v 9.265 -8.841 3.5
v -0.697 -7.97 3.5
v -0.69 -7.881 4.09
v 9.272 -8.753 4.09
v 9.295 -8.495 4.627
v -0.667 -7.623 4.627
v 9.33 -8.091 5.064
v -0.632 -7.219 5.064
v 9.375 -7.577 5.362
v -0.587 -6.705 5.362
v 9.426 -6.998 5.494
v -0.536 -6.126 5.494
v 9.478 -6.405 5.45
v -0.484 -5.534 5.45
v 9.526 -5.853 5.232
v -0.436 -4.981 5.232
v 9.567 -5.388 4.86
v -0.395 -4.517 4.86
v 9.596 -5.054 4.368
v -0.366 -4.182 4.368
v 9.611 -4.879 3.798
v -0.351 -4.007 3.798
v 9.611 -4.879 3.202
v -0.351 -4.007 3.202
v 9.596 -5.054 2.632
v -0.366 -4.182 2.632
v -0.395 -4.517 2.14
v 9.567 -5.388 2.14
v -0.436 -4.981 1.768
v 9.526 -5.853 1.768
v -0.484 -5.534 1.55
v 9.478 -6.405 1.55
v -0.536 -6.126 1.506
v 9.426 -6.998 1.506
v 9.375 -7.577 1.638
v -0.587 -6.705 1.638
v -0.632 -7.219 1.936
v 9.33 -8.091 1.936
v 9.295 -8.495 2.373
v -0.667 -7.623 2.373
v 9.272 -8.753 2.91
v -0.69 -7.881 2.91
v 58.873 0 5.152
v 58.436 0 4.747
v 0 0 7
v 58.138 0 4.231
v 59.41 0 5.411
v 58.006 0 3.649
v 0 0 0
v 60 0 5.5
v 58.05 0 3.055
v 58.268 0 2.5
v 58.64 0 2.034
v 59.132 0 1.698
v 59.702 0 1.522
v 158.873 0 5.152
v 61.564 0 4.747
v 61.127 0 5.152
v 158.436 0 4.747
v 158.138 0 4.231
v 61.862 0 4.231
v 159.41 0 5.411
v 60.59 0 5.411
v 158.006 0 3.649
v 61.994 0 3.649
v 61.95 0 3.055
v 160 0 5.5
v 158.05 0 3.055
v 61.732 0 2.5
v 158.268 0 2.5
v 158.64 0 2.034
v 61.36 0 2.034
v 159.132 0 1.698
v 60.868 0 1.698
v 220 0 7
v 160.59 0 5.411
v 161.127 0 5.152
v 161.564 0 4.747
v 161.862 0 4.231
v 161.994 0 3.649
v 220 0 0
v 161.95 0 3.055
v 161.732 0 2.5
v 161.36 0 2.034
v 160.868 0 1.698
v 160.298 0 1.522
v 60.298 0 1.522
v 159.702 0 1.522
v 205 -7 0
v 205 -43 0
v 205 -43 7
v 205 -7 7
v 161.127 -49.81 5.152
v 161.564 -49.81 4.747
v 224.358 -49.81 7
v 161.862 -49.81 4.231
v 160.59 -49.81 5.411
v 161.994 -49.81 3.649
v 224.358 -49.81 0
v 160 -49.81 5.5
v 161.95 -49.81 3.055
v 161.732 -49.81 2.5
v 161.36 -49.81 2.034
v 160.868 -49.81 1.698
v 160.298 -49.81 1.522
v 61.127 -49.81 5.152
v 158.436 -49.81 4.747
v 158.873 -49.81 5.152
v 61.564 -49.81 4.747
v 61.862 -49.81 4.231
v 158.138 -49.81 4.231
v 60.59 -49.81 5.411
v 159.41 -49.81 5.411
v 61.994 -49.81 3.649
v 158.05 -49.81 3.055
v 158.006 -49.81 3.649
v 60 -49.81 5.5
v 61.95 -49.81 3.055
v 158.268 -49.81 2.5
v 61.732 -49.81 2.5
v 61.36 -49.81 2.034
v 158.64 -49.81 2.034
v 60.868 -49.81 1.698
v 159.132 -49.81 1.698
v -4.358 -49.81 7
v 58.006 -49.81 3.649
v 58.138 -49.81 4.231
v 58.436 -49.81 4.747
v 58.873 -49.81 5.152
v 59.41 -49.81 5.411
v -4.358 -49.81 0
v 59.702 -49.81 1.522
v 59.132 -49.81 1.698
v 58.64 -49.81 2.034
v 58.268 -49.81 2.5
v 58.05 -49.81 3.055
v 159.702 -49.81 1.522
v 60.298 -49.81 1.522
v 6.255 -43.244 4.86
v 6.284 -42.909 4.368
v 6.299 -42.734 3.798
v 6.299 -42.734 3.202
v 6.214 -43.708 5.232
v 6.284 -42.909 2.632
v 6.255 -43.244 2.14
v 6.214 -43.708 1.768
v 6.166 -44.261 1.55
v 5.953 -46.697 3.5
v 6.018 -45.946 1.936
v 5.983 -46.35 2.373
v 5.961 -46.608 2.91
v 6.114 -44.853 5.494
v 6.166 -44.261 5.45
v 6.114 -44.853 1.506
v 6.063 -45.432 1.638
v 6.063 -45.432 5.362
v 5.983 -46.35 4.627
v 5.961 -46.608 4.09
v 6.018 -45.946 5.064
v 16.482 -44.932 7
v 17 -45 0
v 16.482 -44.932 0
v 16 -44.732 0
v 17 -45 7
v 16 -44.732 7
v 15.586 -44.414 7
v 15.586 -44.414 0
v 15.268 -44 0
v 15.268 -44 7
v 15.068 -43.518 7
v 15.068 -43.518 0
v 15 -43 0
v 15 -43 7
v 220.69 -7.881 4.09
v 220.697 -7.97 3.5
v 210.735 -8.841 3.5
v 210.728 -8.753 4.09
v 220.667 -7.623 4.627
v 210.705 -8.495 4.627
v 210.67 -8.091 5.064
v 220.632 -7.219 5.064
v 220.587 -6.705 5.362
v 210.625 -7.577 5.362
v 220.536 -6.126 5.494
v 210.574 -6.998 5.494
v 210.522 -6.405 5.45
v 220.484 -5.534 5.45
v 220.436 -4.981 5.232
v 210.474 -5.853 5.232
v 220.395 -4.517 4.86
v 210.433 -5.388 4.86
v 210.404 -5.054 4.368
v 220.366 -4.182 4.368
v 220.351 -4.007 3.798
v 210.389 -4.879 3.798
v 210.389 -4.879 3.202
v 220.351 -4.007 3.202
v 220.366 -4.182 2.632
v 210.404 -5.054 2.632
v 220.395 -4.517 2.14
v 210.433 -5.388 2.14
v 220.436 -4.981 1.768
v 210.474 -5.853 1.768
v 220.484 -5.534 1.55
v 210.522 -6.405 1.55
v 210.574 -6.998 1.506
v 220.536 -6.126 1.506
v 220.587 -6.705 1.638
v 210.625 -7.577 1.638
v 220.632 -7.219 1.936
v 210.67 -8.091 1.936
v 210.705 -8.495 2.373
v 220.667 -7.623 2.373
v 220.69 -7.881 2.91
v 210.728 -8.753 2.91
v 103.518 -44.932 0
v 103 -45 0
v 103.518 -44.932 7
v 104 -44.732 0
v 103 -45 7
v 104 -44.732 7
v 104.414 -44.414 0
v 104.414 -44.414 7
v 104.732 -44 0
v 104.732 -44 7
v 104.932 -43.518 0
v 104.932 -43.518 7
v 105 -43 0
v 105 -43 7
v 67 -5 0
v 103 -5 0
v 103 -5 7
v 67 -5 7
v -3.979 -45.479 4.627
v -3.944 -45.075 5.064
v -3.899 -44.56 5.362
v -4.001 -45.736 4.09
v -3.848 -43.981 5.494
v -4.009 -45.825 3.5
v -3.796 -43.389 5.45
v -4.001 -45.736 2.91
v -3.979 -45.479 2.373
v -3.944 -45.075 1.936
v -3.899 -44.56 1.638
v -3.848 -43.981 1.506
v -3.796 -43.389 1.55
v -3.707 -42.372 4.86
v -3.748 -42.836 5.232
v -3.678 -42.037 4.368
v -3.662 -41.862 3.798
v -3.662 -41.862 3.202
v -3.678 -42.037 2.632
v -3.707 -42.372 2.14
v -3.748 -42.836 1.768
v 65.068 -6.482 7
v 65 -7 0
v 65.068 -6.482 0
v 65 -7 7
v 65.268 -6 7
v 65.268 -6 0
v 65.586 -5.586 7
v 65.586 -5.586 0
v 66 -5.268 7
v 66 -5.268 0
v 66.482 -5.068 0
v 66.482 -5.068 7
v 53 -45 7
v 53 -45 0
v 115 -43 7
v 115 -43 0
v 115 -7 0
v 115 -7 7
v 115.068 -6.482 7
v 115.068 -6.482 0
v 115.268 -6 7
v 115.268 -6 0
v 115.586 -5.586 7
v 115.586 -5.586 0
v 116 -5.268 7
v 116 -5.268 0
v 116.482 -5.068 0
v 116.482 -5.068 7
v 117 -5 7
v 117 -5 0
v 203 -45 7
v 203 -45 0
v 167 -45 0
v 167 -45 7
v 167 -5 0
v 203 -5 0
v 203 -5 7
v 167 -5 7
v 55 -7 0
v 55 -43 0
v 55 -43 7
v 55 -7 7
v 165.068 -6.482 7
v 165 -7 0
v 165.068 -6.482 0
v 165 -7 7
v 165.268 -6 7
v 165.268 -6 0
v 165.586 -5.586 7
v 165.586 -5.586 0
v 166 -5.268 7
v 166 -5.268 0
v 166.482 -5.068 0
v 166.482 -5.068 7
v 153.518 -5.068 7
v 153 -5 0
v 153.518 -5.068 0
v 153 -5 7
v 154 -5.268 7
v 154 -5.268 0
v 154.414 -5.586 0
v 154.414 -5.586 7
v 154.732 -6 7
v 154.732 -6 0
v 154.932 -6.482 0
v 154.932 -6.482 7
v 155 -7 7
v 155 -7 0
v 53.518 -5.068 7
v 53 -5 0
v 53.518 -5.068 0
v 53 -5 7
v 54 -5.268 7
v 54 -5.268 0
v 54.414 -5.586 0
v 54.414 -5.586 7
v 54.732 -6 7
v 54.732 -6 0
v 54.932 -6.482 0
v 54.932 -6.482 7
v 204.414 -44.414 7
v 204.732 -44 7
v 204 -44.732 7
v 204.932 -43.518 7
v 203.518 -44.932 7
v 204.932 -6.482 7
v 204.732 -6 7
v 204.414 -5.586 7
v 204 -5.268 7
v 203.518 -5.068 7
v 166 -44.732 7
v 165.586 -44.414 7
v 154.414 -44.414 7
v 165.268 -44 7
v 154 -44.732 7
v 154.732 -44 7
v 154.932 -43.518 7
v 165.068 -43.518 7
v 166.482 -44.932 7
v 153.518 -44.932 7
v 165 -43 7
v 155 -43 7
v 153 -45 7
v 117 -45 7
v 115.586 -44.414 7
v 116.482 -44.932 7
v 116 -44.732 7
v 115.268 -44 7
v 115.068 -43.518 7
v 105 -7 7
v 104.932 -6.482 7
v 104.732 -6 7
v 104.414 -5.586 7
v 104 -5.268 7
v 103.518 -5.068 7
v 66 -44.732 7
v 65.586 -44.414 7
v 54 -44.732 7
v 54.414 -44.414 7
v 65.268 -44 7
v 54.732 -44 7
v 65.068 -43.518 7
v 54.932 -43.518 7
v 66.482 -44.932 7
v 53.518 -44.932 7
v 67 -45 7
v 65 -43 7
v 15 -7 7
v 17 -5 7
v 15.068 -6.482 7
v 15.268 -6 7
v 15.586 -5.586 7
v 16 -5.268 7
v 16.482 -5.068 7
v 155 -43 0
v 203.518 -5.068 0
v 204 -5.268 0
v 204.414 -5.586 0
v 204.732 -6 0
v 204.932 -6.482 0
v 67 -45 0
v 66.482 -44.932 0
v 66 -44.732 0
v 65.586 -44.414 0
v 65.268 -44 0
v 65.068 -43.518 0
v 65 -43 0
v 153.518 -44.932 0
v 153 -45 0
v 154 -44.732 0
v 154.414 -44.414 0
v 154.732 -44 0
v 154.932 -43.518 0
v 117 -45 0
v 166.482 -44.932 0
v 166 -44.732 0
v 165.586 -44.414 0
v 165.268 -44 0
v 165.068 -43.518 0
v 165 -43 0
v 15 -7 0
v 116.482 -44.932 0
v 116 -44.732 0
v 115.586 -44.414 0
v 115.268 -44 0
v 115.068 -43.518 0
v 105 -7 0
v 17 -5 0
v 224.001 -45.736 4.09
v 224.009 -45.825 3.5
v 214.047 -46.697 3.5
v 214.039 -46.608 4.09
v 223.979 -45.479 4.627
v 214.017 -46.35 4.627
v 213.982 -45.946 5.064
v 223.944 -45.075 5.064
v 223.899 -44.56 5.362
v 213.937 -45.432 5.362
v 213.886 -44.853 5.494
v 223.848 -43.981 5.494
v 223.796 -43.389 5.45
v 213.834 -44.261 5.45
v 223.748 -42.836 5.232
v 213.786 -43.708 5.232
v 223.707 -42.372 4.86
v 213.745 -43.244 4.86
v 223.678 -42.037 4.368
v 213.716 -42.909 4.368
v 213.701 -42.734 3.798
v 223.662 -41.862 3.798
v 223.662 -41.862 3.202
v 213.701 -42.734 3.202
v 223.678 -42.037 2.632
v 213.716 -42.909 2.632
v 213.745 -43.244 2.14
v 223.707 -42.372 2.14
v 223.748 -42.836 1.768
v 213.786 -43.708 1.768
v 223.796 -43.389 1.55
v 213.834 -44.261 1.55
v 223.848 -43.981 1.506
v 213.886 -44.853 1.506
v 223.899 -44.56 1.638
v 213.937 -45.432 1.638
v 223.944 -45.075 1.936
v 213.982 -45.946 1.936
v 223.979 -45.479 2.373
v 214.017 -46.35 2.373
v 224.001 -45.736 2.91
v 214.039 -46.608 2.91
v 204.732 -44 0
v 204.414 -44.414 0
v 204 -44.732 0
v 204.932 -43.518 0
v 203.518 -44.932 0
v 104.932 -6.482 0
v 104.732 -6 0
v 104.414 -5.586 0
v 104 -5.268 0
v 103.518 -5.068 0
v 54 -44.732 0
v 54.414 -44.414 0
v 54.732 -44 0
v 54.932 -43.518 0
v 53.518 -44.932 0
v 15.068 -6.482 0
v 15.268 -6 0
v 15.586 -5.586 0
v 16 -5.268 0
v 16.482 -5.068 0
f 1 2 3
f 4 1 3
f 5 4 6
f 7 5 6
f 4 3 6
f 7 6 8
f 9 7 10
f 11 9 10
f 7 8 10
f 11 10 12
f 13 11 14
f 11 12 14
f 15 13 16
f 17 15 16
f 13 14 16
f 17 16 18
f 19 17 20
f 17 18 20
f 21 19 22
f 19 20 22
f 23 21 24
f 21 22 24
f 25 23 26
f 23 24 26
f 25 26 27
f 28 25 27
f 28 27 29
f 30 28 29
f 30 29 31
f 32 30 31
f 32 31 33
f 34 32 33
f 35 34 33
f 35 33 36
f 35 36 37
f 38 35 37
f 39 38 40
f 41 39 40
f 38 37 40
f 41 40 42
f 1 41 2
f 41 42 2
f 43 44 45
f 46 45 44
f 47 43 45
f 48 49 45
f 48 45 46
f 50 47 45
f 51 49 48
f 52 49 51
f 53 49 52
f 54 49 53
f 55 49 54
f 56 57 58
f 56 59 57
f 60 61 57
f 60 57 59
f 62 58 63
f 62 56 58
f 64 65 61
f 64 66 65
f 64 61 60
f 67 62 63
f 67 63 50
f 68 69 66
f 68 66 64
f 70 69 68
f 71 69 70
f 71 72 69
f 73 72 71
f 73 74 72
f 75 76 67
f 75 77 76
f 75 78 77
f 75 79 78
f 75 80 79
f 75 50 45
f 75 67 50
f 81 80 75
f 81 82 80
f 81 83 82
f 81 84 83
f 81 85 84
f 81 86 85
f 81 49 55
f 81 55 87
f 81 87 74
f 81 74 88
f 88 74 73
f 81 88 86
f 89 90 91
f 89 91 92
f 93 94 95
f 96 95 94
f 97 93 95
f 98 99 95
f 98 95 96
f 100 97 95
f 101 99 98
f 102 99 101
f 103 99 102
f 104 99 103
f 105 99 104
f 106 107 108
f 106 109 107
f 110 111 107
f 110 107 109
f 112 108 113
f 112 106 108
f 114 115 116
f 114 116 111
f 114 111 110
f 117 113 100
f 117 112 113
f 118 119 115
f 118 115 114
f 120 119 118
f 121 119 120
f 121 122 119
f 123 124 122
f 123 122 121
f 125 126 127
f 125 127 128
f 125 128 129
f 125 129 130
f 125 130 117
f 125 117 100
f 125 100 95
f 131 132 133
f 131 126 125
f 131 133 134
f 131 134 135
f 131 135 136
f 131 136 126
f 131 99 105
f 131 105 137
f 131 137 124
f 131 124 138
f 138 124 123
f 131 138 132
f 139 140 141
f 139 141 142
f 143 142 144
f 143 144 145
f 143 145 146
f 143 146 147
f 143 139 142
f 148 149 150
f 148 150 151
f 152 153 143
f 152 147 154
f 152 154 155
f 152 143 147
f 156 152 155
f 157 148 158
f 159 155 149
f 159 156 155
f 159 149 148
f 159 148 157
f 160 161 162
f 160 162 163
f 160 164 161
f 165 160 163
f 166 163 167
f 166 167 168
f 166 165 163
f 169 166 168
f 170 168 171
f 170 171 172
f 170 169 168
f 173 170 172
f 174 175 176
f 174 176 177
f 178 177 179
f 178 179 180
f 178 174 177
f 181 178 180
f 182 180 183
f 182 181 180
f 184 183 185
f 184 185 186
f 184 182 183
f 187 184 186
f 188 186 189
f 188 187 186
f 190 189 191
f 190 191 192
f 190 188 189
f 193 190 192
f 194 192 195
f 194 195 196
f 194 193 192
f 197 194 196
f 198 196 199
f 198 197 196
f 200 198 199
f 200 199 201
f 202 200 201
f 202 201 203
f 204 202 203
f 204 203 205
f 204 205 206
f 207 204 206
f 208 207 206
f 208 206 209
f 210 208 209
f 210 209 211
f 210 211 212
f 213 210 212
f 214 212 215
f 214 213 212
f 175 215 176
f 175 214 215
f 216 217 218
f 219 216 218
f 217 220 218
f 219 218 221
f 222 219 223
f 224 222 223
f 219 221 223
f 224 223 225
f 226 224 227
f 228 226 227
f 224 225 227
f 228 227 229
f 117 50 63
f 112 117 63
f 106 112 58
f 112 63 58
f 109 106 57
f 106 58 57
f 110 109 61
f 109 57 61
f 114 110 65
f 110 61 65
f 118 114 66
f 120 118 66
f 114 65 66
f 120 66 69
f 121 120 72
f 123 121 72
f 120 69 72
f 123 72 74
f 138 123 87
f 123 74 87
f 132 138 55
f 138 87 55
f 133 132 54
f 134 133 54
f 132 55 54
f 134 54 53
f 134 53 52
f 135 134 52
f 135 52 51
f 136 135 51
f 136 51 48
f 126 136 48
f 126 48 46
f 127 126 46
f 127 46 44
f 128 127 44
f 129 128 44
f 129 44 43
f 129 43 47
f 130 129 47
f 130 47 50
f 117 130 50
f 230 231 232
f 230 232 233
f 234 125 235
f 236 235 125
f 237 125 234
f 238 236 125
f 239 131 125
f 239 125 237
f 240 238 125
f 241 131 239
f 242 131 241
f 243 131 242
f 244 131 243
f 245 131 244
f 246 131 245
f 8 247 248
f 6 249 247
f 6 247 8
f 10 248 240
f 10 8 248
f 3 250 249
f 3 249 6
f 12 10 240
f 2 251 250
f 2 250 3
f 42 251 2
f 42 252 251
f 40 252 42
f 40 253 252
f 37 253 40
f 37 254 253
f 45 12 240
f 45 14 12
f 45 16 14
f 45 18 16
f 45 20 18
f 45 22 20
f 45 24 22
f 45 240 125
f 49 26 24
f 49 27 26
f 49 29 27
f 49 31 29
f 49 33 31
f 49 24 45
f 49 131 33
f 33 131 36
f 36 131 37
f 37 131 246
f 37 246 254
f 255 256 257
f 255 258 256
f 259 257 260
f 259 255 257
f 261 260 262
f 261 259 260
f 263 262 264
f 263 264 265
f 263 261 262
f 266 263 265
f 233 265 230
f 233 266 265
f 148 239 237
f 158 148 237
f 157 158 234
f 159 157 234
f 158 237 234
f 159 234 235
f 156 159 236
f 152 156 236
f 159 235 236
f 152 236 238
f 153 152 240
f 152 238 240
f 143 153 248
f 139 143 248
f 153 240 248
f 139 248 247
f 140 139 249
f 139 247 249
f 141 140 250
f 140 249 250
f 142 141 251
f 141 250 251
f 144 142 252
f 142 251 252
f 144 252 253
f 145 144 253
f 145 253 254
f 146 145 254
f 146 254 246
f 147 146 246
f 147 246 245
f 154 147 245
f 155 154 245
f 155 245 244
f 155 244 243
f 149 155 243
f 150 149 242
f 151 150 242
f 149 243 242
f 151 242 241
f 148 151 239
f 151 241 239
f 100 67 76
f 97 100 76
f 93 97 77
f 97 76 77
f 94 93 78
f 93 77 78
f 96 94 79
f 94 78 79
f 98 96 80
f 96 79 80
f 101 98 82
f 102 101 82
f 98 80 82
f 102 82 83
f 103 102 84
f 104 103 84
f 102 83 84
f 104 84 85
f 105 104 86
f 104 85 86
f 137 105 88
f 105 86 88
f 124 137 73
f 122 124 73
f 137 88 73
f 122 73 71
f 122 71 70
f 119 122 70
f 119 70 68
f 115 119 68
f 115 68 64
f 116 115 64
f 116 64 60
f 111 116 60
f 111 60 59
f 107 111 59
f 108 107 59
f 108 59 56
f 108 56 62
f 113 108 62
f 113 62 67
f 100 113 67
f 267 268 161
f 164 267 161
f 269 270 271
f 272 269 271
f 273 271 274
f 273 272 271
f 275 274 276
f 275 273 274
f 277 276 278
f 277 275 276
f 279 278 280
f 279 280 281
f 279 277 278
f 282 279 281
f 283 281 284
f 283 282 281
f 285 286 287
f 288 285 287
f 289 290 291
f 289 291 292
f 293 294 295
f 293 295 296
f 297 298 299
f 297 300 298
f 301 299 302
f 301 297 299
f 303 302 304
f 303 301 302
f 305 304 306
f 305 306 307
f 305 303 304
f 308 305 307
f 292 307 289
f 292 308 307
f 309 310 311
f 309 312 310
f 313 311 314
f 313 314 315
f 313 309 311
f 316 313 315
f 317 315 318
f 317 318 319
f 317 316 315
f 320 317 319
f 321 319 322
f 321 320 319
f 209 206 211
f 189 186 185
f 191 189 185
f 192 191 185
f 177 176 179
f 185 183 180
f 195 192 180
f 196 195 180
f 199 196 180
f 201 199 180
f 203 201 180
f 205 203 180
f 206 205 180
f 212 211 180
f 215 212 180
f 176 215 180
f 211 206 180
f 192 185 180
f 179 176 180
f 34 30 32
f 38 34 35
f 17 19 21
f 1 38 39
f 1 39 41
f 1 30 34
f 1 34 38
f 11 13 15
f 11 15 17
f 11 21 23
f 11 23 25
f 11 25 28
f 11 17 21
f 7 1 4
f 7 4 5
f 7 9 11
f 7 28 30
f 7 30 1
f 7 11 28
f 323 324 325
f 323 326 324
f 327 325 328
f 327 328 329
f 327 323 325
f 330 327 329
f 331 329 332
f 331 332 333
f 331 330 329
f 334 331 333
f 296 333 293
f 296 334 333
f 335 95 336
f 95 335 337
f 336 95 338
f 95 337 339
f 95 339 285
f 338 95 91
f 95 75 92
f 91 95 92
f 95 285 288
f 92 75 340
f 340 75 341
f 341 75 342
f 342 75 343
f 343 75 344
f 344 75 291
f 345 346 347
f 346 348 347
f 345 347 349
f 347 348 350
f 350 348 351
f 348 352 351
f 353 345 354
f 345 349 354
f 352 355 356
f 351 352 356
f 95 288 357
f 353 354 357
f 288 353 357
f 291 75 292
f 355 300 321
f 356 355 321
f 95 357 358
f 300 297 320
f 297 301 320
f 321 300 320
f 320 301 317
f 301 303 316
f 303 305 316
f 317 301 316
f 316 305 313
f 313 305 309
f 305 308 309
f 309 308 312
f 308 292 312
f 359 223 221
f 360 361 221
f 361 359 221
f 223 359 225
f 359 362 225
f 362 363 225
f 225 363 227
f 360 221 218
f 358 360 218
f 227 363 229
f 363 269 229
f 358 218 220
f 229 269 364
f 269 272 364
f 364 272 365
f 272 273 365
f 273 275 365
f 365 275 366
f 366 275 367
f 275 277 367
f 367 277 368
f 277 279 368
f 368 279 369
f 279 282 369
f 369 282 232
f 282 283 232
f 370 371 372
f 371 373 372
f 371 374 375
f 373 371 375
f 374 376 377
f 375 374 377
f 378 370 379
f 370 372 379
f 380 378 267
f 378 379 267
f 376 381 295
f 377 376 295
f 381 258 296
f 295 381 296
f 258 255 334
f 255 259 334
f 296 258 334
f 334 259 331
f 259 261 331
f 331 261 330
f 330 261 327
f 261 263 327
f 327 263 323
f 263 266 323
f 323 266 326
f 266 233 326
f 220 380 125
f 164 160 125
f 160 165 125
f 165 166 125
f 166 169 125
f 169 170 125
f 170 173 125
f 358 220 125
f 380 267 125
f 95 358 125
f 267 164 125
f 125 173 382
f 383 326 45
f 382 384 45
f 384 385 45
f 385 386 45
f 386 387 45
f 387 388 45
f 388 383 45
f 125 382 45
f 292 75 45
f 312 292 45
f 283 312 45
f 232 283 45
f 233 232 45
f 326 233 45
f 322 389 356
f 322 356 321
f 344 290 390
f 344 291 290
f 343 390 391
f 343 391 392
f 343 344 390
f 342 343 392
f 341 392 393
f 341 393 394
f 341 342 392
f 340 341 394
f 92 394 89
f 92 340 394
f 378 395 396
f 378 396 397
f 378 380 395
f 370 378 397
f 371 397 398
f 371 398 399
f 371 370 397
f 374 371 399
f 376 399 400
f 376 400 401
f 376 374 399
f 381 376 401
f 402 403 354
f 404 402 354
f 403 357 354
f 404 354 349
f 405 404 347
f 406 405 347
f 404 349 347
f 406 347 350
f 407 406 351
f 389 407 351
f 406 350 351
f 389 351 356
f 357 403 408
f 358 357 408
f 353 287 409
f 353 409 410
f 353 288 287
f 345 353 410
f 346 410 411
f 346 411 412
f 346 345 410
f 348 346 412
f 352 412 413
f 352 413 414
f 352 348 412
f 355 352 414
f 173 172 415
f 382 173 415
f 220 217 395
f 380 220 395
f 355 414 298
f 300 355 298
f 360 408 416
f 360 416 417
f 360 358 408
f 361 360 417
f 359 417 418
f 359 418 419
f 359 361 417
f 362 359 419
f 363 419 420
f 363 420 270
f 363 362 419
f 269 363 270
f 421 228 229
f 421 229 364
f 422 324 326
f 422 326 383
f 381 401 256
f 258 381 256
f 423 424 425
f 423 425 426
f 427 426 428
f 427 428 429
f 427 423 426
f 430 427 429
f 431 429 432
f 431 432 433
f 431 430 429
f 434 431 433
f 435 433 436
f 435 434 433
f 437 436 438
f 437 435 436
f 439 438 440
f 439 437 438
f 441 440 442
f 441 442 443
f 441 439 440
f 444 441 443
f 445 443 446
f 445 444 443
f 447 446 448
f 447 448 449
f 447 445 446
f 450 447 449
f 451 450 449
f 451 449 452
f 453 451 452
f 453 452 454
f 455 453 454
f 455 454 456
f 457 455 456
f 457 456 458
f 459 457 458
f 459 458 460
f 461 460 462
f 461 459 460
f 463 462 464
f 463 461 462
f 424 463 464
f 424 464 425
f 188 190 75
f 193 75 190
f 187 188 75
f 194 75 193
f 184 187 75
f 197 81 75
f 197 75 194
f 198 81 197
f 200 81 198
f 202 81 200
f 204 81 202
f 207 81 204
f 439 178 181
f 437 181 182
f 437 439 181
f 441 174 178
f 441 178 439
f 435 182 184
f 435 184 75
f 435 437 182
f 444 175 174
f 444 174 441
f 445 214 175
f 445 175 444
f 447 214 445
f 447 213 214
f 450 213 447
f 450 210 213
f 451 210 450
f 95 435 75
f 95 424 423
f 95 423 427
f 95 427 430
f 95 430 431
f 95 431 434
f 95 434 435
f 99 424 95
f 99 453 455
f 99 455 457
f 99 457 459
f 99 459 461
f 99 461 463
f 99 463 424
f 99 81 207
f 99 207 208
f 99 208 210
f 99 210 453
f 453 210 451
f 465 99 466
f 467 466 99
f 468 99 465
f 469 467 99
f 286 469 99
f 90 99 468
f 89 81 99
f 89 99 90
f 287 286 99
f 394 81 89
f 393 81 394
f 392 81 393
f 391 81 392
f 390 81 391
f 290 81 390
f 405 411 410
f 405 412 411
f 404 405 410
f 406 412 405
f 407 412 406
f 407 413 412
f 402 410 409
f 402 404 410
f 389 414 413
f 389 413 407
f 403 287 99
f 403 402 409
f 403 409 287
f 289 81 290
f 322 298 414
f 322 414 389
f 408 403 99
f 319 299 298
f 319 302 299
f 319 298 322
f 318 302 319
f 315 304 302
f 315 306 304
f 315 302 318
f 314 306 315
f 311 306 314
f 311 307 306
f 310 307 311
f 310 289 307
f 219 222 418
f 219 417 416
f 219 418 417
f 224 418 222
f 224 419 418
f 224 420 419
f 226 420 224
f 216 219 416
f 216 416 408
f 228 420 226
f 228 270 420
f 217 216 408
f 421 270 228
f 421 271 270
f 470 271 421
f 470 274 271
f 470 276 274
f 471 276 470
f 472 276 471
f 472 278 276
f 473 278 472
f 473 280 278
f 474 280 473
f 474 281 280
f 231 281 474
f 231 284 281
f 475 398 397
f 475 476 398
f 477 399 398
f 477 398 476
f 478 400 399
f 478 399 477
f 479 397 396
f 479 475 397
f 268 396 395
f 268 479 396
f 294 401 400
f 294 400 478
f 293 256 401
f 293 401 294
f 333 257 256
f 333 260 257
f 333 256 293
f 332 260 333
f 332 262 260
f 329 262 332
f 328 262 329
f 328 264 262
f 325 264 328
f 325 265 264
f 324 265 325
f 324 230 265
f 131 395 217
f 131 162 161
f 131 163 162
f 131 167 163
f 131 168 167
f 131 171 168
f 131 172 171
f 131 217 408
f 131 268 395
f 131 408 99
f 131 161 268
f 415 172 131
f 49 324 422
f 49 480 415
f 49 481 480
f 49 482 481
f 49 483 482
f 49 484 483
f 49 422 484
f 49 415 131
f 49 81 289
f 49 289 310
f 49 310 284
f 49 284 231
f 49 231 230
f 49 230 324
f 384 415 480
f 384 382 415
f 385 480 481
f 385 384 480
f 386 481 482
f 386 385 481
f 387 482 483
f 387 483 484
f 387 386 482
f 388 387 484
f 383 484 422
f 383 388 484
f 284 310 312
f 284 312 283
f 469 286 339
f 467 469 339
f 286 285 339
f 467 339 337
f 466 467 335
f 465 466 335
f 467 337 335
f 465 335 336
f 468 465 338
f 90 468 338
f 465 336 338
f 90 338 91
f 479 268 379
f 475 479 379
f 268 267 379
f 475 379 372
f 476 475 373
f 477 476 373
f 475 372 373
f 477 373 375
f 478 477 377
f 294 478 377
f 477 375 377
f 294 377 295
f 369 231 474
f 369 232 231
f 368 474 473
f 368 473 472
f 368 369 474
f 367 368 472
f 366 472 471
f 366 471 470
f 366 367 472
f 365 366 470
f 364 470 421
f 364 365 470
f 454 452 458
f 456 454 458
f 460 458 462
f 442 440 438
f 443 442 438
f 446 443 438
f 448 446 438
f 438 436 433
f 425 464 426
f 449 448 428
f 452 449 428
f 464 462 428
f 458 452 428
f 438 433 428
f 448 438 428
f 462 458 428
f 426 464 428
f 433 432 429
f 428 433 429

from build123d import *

# Parameters (mm, degrees)
EXTRUDE_1_DEPTH     = 7
SKETCH_2_R          = 2
CUT_EXTRUDE_1_DEPTH = 10
SKETCH_3_W          = 40
SKETCH_3_H          = 40
CUT_EXTRUDE_2_DEPTH = 7
FILLET_1_R          = 2
FILLET_2_R          = 2
SKETCH_4_R          = 2
CUT_EXTRUDE_3_DEPTH = 90


with BuildPart() as part:
    # 草图1 → 凸台-拉伸1 (new body)
    with BuildSketch(Plane.XY):
        Polygon((0, 0), (220, 0), (224.357787137, -49.809734905), (-4.357787137, -49.809734905), align=None)
    extrude(amount=EXTRUDE_1_DEPTH)

    # 草图2 → 切除-拉伸1 (cut)
    with BuildSketch(Plane(origin=(0, 0, 0), x_dir=(0, 0, 1), z_dir=(-0.9961946980917453, 0.08715574274766177, 0))):
        with Locations(Location((3.5, -6, 0), (0, 0, 270))):
            Circle(SKETCH_2_R)
        with Locations(Location((3.5, -44, 0), (0, 0, 270))):
            Circle(SKETCH_2_R)
    cut_extrude_1 = extrude(amount=-CUT_EXTRUDE_1_DEPTH, mode=Mode.SUBTRACT)

    # 镜向1: 切除-拉伸1 across plane
    add(cut_extrude_1.mirror(Plane(origin=(110, 0, 0), x_dir=(0, 0, 1), z_dir=(1, 0, 0))), mode=Mode.SUBTRACT)

    # 草图3 → 切除-拉伸2 (cut)
    with BuildSketch(Plane(origin=(0, 0, 0), x_dir=(-1, 0, 0), z_dir=(0, 0, -1))):
        with Locations((-185, -25)):
            Rectangle(SKETCH_3_W, SKETCH_3_H)
        with Locations((-135, -25)):
            Rectangle(SKETCH_3_W, SKETCH_3_H)
        with Locations((-35, -25)):
            Rectangle(SKETCH_3_W, SKETCH_3_H)
        with Locations((-85, -25)):
            Rectangle(SKETCH_3_W, SKETCH_3_H)
    extrude(amount=-CUT_EXTRUDE_2_DEPTH, mode=Mode.SUBTRACT)

    # 圆角1
    fillet_1_edges = [part.edges().sort_by_distance(p)[0] for p in [
        (205, -45, 3.5),
        (205, -5, 3.5),
        (165, -5, 3.5),
        (165, -45, 3.5),
        (115, -45, 3.5),
        (155, -45, 3.5),
        (155, -5, 3.5),
        (115, -5, 3.5),
    ]]
    fillet(fillet_1_edges, radius=FILLET_1_R)

    # 圆角2
    fillet_2_edges = [part.edges().sort_by_distance(p)[0] for p in [
        (15, -5, 3.5),
        (15, -45, 3.5),
        (55, -45, 3.5),
        (55, -5, 3.5),
        (65, -45, 3.5),
        (105, -45, 3.5),
        (105, -5, 3.5),
        (65, -5, 3.5),
    ]]
    fillet(fillet_2_edges, radius=FILLET_2_R)

    # 草图4 → 切除-拉伸3 (cut)
    with BuildSketch(Plane(origin=(0, 0, 0), x_dir=(1, 0, 0), z_dir=(0, 1, 0))):
        with Locations(Location((60, -3.5, 0), (0, 0, 270))):
            Circle(SKETCH_4_R)
        with Locations(Location((160, -3.5, 0), (0, 0, 270))):
            Circle(SKETCH_4_R)
    extrude(amount=-CUT_EXTRUDE_3_DEPTH, mode=Mode.SUBTRACT)


solid = part.part
